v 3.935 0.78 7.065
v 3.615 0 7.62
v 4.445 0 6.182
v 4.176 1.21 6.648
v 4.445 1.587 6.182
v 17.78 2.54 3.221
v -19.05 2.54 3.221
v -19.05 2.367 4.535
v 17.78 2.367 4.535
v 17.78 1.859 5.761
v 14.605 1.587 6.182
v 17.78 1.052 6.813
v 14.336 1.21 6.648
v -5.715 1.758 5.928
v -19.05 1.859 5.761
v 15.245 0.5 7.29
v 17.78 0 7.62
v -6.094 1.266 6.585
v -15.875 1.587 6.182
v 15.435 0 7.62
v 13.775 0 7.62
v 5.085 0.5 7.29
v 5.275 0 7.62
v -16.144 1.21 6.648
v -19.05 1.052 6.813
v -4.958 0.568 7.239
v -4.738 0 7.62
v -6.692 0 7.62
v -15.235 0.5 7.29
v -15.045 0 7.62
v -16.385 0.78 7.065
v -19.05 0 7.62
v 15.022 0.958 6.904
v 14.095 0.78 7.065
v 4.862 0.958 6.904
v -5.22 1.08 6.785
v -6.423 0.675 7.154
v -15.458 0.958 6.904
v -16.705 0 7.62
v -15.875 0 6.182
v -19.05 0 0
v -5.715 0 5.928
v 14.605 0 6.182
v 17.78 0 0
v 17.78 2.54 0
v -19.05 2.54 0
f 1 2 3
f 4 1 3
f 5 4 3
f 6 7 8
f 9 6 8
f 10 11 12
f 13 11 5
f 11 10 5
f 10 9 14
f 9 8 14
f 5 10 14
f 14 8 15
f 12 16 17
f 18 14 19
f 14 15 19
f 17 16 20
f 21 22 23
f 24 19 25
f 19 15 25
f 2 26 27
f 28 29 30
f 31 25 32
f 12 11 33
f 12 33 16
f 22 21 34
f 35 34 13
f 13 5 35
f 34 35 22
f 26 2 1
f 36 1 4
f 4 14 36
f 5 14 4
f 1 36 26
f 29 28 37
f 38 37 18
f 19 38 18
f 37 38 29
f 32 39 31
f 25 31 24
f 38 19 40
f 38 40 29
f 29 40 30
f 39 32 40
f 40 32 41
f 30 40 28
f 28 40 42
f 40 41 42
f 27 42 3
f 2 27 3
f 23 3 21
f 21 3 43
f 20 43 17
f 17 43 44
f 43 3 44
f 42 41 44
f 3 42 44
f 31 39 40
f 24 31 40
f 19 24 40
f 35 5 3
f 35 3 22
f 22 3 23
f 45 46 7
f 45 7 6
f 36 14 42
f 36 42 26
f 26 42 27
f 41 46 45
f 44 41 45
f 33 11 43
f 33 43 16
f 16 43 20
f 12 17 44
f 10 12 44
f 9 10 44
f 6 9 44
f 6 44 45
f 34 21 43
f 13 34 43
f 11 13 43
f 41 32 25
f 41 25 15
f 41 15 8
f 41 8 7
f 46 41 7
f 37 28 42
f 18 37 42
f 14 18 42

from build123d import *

# Parameters (mm, degrees)
F0_W        = 36.83
F0_H        = 2.54
F1_DEPTH    = 7.62
F3_T1_DEPTH = 58.8270452561
F4_DEPTH    = 25.4


# Not quite as in the source:
# - a fillet or chamfer that OpenCascade refuses, or shapes differently, is made with other operations: its cross-section is extruded or revolved along the edge and cut away or added


with BuildPart() as f1:
    # F0 (on Top) → F1 (new body)
    with BuildSketch(Plane.XY):
        with Locations((-0.635, 1.27)):
            Rectangle(F0_W, F0_H)
    extrude(amount=F1_DEPTH)

    # F3: fillet of radius 5.08 on 1 edges, made by hand

    # F3_s2 → F3_t1 (cut)
    with BuildSketch(Plane.YZ.offset(-30.0485226281)):
        with BuildLine():
            ThreePointArc((2.54, 3.2205909488), (1.8594090512, 5.7605909488), (0, 7.62))
            Line((0, 7.62), (2.54, 7.62))
            Line((2.54, 7.62), (2.54, 3.2205909488))
        make_face()
    extrude(amount=F3_T1_DEPTH, mode=Mode.SUBTRACT)

    # F2 (on face) → F4 (cut)
    with BuildSketch(Plane.XZ):
        Polygon((-15.875, 6.1822954744), (-15.0449409051, 7.62), (-16.7050590949, 7.62), align=None)
        Polygon((-4.7382939367, 7.62), (-6.6917060633, 7.62), (-5.715, 5.9282954744), align=None)
        Polygon((5.2750590949, 7.62), (3.6149409051, 7.62), (4.445, 6.1822954744), align=None)
        Polygon((15.4350590949, 7.62), (13.7749409051, 7.62), (14.605, 6.1822954744), align=None)
    extrude(amount=-F4_DEPTH, mode=Mode.SUBTRACT)


solid = f1.part
